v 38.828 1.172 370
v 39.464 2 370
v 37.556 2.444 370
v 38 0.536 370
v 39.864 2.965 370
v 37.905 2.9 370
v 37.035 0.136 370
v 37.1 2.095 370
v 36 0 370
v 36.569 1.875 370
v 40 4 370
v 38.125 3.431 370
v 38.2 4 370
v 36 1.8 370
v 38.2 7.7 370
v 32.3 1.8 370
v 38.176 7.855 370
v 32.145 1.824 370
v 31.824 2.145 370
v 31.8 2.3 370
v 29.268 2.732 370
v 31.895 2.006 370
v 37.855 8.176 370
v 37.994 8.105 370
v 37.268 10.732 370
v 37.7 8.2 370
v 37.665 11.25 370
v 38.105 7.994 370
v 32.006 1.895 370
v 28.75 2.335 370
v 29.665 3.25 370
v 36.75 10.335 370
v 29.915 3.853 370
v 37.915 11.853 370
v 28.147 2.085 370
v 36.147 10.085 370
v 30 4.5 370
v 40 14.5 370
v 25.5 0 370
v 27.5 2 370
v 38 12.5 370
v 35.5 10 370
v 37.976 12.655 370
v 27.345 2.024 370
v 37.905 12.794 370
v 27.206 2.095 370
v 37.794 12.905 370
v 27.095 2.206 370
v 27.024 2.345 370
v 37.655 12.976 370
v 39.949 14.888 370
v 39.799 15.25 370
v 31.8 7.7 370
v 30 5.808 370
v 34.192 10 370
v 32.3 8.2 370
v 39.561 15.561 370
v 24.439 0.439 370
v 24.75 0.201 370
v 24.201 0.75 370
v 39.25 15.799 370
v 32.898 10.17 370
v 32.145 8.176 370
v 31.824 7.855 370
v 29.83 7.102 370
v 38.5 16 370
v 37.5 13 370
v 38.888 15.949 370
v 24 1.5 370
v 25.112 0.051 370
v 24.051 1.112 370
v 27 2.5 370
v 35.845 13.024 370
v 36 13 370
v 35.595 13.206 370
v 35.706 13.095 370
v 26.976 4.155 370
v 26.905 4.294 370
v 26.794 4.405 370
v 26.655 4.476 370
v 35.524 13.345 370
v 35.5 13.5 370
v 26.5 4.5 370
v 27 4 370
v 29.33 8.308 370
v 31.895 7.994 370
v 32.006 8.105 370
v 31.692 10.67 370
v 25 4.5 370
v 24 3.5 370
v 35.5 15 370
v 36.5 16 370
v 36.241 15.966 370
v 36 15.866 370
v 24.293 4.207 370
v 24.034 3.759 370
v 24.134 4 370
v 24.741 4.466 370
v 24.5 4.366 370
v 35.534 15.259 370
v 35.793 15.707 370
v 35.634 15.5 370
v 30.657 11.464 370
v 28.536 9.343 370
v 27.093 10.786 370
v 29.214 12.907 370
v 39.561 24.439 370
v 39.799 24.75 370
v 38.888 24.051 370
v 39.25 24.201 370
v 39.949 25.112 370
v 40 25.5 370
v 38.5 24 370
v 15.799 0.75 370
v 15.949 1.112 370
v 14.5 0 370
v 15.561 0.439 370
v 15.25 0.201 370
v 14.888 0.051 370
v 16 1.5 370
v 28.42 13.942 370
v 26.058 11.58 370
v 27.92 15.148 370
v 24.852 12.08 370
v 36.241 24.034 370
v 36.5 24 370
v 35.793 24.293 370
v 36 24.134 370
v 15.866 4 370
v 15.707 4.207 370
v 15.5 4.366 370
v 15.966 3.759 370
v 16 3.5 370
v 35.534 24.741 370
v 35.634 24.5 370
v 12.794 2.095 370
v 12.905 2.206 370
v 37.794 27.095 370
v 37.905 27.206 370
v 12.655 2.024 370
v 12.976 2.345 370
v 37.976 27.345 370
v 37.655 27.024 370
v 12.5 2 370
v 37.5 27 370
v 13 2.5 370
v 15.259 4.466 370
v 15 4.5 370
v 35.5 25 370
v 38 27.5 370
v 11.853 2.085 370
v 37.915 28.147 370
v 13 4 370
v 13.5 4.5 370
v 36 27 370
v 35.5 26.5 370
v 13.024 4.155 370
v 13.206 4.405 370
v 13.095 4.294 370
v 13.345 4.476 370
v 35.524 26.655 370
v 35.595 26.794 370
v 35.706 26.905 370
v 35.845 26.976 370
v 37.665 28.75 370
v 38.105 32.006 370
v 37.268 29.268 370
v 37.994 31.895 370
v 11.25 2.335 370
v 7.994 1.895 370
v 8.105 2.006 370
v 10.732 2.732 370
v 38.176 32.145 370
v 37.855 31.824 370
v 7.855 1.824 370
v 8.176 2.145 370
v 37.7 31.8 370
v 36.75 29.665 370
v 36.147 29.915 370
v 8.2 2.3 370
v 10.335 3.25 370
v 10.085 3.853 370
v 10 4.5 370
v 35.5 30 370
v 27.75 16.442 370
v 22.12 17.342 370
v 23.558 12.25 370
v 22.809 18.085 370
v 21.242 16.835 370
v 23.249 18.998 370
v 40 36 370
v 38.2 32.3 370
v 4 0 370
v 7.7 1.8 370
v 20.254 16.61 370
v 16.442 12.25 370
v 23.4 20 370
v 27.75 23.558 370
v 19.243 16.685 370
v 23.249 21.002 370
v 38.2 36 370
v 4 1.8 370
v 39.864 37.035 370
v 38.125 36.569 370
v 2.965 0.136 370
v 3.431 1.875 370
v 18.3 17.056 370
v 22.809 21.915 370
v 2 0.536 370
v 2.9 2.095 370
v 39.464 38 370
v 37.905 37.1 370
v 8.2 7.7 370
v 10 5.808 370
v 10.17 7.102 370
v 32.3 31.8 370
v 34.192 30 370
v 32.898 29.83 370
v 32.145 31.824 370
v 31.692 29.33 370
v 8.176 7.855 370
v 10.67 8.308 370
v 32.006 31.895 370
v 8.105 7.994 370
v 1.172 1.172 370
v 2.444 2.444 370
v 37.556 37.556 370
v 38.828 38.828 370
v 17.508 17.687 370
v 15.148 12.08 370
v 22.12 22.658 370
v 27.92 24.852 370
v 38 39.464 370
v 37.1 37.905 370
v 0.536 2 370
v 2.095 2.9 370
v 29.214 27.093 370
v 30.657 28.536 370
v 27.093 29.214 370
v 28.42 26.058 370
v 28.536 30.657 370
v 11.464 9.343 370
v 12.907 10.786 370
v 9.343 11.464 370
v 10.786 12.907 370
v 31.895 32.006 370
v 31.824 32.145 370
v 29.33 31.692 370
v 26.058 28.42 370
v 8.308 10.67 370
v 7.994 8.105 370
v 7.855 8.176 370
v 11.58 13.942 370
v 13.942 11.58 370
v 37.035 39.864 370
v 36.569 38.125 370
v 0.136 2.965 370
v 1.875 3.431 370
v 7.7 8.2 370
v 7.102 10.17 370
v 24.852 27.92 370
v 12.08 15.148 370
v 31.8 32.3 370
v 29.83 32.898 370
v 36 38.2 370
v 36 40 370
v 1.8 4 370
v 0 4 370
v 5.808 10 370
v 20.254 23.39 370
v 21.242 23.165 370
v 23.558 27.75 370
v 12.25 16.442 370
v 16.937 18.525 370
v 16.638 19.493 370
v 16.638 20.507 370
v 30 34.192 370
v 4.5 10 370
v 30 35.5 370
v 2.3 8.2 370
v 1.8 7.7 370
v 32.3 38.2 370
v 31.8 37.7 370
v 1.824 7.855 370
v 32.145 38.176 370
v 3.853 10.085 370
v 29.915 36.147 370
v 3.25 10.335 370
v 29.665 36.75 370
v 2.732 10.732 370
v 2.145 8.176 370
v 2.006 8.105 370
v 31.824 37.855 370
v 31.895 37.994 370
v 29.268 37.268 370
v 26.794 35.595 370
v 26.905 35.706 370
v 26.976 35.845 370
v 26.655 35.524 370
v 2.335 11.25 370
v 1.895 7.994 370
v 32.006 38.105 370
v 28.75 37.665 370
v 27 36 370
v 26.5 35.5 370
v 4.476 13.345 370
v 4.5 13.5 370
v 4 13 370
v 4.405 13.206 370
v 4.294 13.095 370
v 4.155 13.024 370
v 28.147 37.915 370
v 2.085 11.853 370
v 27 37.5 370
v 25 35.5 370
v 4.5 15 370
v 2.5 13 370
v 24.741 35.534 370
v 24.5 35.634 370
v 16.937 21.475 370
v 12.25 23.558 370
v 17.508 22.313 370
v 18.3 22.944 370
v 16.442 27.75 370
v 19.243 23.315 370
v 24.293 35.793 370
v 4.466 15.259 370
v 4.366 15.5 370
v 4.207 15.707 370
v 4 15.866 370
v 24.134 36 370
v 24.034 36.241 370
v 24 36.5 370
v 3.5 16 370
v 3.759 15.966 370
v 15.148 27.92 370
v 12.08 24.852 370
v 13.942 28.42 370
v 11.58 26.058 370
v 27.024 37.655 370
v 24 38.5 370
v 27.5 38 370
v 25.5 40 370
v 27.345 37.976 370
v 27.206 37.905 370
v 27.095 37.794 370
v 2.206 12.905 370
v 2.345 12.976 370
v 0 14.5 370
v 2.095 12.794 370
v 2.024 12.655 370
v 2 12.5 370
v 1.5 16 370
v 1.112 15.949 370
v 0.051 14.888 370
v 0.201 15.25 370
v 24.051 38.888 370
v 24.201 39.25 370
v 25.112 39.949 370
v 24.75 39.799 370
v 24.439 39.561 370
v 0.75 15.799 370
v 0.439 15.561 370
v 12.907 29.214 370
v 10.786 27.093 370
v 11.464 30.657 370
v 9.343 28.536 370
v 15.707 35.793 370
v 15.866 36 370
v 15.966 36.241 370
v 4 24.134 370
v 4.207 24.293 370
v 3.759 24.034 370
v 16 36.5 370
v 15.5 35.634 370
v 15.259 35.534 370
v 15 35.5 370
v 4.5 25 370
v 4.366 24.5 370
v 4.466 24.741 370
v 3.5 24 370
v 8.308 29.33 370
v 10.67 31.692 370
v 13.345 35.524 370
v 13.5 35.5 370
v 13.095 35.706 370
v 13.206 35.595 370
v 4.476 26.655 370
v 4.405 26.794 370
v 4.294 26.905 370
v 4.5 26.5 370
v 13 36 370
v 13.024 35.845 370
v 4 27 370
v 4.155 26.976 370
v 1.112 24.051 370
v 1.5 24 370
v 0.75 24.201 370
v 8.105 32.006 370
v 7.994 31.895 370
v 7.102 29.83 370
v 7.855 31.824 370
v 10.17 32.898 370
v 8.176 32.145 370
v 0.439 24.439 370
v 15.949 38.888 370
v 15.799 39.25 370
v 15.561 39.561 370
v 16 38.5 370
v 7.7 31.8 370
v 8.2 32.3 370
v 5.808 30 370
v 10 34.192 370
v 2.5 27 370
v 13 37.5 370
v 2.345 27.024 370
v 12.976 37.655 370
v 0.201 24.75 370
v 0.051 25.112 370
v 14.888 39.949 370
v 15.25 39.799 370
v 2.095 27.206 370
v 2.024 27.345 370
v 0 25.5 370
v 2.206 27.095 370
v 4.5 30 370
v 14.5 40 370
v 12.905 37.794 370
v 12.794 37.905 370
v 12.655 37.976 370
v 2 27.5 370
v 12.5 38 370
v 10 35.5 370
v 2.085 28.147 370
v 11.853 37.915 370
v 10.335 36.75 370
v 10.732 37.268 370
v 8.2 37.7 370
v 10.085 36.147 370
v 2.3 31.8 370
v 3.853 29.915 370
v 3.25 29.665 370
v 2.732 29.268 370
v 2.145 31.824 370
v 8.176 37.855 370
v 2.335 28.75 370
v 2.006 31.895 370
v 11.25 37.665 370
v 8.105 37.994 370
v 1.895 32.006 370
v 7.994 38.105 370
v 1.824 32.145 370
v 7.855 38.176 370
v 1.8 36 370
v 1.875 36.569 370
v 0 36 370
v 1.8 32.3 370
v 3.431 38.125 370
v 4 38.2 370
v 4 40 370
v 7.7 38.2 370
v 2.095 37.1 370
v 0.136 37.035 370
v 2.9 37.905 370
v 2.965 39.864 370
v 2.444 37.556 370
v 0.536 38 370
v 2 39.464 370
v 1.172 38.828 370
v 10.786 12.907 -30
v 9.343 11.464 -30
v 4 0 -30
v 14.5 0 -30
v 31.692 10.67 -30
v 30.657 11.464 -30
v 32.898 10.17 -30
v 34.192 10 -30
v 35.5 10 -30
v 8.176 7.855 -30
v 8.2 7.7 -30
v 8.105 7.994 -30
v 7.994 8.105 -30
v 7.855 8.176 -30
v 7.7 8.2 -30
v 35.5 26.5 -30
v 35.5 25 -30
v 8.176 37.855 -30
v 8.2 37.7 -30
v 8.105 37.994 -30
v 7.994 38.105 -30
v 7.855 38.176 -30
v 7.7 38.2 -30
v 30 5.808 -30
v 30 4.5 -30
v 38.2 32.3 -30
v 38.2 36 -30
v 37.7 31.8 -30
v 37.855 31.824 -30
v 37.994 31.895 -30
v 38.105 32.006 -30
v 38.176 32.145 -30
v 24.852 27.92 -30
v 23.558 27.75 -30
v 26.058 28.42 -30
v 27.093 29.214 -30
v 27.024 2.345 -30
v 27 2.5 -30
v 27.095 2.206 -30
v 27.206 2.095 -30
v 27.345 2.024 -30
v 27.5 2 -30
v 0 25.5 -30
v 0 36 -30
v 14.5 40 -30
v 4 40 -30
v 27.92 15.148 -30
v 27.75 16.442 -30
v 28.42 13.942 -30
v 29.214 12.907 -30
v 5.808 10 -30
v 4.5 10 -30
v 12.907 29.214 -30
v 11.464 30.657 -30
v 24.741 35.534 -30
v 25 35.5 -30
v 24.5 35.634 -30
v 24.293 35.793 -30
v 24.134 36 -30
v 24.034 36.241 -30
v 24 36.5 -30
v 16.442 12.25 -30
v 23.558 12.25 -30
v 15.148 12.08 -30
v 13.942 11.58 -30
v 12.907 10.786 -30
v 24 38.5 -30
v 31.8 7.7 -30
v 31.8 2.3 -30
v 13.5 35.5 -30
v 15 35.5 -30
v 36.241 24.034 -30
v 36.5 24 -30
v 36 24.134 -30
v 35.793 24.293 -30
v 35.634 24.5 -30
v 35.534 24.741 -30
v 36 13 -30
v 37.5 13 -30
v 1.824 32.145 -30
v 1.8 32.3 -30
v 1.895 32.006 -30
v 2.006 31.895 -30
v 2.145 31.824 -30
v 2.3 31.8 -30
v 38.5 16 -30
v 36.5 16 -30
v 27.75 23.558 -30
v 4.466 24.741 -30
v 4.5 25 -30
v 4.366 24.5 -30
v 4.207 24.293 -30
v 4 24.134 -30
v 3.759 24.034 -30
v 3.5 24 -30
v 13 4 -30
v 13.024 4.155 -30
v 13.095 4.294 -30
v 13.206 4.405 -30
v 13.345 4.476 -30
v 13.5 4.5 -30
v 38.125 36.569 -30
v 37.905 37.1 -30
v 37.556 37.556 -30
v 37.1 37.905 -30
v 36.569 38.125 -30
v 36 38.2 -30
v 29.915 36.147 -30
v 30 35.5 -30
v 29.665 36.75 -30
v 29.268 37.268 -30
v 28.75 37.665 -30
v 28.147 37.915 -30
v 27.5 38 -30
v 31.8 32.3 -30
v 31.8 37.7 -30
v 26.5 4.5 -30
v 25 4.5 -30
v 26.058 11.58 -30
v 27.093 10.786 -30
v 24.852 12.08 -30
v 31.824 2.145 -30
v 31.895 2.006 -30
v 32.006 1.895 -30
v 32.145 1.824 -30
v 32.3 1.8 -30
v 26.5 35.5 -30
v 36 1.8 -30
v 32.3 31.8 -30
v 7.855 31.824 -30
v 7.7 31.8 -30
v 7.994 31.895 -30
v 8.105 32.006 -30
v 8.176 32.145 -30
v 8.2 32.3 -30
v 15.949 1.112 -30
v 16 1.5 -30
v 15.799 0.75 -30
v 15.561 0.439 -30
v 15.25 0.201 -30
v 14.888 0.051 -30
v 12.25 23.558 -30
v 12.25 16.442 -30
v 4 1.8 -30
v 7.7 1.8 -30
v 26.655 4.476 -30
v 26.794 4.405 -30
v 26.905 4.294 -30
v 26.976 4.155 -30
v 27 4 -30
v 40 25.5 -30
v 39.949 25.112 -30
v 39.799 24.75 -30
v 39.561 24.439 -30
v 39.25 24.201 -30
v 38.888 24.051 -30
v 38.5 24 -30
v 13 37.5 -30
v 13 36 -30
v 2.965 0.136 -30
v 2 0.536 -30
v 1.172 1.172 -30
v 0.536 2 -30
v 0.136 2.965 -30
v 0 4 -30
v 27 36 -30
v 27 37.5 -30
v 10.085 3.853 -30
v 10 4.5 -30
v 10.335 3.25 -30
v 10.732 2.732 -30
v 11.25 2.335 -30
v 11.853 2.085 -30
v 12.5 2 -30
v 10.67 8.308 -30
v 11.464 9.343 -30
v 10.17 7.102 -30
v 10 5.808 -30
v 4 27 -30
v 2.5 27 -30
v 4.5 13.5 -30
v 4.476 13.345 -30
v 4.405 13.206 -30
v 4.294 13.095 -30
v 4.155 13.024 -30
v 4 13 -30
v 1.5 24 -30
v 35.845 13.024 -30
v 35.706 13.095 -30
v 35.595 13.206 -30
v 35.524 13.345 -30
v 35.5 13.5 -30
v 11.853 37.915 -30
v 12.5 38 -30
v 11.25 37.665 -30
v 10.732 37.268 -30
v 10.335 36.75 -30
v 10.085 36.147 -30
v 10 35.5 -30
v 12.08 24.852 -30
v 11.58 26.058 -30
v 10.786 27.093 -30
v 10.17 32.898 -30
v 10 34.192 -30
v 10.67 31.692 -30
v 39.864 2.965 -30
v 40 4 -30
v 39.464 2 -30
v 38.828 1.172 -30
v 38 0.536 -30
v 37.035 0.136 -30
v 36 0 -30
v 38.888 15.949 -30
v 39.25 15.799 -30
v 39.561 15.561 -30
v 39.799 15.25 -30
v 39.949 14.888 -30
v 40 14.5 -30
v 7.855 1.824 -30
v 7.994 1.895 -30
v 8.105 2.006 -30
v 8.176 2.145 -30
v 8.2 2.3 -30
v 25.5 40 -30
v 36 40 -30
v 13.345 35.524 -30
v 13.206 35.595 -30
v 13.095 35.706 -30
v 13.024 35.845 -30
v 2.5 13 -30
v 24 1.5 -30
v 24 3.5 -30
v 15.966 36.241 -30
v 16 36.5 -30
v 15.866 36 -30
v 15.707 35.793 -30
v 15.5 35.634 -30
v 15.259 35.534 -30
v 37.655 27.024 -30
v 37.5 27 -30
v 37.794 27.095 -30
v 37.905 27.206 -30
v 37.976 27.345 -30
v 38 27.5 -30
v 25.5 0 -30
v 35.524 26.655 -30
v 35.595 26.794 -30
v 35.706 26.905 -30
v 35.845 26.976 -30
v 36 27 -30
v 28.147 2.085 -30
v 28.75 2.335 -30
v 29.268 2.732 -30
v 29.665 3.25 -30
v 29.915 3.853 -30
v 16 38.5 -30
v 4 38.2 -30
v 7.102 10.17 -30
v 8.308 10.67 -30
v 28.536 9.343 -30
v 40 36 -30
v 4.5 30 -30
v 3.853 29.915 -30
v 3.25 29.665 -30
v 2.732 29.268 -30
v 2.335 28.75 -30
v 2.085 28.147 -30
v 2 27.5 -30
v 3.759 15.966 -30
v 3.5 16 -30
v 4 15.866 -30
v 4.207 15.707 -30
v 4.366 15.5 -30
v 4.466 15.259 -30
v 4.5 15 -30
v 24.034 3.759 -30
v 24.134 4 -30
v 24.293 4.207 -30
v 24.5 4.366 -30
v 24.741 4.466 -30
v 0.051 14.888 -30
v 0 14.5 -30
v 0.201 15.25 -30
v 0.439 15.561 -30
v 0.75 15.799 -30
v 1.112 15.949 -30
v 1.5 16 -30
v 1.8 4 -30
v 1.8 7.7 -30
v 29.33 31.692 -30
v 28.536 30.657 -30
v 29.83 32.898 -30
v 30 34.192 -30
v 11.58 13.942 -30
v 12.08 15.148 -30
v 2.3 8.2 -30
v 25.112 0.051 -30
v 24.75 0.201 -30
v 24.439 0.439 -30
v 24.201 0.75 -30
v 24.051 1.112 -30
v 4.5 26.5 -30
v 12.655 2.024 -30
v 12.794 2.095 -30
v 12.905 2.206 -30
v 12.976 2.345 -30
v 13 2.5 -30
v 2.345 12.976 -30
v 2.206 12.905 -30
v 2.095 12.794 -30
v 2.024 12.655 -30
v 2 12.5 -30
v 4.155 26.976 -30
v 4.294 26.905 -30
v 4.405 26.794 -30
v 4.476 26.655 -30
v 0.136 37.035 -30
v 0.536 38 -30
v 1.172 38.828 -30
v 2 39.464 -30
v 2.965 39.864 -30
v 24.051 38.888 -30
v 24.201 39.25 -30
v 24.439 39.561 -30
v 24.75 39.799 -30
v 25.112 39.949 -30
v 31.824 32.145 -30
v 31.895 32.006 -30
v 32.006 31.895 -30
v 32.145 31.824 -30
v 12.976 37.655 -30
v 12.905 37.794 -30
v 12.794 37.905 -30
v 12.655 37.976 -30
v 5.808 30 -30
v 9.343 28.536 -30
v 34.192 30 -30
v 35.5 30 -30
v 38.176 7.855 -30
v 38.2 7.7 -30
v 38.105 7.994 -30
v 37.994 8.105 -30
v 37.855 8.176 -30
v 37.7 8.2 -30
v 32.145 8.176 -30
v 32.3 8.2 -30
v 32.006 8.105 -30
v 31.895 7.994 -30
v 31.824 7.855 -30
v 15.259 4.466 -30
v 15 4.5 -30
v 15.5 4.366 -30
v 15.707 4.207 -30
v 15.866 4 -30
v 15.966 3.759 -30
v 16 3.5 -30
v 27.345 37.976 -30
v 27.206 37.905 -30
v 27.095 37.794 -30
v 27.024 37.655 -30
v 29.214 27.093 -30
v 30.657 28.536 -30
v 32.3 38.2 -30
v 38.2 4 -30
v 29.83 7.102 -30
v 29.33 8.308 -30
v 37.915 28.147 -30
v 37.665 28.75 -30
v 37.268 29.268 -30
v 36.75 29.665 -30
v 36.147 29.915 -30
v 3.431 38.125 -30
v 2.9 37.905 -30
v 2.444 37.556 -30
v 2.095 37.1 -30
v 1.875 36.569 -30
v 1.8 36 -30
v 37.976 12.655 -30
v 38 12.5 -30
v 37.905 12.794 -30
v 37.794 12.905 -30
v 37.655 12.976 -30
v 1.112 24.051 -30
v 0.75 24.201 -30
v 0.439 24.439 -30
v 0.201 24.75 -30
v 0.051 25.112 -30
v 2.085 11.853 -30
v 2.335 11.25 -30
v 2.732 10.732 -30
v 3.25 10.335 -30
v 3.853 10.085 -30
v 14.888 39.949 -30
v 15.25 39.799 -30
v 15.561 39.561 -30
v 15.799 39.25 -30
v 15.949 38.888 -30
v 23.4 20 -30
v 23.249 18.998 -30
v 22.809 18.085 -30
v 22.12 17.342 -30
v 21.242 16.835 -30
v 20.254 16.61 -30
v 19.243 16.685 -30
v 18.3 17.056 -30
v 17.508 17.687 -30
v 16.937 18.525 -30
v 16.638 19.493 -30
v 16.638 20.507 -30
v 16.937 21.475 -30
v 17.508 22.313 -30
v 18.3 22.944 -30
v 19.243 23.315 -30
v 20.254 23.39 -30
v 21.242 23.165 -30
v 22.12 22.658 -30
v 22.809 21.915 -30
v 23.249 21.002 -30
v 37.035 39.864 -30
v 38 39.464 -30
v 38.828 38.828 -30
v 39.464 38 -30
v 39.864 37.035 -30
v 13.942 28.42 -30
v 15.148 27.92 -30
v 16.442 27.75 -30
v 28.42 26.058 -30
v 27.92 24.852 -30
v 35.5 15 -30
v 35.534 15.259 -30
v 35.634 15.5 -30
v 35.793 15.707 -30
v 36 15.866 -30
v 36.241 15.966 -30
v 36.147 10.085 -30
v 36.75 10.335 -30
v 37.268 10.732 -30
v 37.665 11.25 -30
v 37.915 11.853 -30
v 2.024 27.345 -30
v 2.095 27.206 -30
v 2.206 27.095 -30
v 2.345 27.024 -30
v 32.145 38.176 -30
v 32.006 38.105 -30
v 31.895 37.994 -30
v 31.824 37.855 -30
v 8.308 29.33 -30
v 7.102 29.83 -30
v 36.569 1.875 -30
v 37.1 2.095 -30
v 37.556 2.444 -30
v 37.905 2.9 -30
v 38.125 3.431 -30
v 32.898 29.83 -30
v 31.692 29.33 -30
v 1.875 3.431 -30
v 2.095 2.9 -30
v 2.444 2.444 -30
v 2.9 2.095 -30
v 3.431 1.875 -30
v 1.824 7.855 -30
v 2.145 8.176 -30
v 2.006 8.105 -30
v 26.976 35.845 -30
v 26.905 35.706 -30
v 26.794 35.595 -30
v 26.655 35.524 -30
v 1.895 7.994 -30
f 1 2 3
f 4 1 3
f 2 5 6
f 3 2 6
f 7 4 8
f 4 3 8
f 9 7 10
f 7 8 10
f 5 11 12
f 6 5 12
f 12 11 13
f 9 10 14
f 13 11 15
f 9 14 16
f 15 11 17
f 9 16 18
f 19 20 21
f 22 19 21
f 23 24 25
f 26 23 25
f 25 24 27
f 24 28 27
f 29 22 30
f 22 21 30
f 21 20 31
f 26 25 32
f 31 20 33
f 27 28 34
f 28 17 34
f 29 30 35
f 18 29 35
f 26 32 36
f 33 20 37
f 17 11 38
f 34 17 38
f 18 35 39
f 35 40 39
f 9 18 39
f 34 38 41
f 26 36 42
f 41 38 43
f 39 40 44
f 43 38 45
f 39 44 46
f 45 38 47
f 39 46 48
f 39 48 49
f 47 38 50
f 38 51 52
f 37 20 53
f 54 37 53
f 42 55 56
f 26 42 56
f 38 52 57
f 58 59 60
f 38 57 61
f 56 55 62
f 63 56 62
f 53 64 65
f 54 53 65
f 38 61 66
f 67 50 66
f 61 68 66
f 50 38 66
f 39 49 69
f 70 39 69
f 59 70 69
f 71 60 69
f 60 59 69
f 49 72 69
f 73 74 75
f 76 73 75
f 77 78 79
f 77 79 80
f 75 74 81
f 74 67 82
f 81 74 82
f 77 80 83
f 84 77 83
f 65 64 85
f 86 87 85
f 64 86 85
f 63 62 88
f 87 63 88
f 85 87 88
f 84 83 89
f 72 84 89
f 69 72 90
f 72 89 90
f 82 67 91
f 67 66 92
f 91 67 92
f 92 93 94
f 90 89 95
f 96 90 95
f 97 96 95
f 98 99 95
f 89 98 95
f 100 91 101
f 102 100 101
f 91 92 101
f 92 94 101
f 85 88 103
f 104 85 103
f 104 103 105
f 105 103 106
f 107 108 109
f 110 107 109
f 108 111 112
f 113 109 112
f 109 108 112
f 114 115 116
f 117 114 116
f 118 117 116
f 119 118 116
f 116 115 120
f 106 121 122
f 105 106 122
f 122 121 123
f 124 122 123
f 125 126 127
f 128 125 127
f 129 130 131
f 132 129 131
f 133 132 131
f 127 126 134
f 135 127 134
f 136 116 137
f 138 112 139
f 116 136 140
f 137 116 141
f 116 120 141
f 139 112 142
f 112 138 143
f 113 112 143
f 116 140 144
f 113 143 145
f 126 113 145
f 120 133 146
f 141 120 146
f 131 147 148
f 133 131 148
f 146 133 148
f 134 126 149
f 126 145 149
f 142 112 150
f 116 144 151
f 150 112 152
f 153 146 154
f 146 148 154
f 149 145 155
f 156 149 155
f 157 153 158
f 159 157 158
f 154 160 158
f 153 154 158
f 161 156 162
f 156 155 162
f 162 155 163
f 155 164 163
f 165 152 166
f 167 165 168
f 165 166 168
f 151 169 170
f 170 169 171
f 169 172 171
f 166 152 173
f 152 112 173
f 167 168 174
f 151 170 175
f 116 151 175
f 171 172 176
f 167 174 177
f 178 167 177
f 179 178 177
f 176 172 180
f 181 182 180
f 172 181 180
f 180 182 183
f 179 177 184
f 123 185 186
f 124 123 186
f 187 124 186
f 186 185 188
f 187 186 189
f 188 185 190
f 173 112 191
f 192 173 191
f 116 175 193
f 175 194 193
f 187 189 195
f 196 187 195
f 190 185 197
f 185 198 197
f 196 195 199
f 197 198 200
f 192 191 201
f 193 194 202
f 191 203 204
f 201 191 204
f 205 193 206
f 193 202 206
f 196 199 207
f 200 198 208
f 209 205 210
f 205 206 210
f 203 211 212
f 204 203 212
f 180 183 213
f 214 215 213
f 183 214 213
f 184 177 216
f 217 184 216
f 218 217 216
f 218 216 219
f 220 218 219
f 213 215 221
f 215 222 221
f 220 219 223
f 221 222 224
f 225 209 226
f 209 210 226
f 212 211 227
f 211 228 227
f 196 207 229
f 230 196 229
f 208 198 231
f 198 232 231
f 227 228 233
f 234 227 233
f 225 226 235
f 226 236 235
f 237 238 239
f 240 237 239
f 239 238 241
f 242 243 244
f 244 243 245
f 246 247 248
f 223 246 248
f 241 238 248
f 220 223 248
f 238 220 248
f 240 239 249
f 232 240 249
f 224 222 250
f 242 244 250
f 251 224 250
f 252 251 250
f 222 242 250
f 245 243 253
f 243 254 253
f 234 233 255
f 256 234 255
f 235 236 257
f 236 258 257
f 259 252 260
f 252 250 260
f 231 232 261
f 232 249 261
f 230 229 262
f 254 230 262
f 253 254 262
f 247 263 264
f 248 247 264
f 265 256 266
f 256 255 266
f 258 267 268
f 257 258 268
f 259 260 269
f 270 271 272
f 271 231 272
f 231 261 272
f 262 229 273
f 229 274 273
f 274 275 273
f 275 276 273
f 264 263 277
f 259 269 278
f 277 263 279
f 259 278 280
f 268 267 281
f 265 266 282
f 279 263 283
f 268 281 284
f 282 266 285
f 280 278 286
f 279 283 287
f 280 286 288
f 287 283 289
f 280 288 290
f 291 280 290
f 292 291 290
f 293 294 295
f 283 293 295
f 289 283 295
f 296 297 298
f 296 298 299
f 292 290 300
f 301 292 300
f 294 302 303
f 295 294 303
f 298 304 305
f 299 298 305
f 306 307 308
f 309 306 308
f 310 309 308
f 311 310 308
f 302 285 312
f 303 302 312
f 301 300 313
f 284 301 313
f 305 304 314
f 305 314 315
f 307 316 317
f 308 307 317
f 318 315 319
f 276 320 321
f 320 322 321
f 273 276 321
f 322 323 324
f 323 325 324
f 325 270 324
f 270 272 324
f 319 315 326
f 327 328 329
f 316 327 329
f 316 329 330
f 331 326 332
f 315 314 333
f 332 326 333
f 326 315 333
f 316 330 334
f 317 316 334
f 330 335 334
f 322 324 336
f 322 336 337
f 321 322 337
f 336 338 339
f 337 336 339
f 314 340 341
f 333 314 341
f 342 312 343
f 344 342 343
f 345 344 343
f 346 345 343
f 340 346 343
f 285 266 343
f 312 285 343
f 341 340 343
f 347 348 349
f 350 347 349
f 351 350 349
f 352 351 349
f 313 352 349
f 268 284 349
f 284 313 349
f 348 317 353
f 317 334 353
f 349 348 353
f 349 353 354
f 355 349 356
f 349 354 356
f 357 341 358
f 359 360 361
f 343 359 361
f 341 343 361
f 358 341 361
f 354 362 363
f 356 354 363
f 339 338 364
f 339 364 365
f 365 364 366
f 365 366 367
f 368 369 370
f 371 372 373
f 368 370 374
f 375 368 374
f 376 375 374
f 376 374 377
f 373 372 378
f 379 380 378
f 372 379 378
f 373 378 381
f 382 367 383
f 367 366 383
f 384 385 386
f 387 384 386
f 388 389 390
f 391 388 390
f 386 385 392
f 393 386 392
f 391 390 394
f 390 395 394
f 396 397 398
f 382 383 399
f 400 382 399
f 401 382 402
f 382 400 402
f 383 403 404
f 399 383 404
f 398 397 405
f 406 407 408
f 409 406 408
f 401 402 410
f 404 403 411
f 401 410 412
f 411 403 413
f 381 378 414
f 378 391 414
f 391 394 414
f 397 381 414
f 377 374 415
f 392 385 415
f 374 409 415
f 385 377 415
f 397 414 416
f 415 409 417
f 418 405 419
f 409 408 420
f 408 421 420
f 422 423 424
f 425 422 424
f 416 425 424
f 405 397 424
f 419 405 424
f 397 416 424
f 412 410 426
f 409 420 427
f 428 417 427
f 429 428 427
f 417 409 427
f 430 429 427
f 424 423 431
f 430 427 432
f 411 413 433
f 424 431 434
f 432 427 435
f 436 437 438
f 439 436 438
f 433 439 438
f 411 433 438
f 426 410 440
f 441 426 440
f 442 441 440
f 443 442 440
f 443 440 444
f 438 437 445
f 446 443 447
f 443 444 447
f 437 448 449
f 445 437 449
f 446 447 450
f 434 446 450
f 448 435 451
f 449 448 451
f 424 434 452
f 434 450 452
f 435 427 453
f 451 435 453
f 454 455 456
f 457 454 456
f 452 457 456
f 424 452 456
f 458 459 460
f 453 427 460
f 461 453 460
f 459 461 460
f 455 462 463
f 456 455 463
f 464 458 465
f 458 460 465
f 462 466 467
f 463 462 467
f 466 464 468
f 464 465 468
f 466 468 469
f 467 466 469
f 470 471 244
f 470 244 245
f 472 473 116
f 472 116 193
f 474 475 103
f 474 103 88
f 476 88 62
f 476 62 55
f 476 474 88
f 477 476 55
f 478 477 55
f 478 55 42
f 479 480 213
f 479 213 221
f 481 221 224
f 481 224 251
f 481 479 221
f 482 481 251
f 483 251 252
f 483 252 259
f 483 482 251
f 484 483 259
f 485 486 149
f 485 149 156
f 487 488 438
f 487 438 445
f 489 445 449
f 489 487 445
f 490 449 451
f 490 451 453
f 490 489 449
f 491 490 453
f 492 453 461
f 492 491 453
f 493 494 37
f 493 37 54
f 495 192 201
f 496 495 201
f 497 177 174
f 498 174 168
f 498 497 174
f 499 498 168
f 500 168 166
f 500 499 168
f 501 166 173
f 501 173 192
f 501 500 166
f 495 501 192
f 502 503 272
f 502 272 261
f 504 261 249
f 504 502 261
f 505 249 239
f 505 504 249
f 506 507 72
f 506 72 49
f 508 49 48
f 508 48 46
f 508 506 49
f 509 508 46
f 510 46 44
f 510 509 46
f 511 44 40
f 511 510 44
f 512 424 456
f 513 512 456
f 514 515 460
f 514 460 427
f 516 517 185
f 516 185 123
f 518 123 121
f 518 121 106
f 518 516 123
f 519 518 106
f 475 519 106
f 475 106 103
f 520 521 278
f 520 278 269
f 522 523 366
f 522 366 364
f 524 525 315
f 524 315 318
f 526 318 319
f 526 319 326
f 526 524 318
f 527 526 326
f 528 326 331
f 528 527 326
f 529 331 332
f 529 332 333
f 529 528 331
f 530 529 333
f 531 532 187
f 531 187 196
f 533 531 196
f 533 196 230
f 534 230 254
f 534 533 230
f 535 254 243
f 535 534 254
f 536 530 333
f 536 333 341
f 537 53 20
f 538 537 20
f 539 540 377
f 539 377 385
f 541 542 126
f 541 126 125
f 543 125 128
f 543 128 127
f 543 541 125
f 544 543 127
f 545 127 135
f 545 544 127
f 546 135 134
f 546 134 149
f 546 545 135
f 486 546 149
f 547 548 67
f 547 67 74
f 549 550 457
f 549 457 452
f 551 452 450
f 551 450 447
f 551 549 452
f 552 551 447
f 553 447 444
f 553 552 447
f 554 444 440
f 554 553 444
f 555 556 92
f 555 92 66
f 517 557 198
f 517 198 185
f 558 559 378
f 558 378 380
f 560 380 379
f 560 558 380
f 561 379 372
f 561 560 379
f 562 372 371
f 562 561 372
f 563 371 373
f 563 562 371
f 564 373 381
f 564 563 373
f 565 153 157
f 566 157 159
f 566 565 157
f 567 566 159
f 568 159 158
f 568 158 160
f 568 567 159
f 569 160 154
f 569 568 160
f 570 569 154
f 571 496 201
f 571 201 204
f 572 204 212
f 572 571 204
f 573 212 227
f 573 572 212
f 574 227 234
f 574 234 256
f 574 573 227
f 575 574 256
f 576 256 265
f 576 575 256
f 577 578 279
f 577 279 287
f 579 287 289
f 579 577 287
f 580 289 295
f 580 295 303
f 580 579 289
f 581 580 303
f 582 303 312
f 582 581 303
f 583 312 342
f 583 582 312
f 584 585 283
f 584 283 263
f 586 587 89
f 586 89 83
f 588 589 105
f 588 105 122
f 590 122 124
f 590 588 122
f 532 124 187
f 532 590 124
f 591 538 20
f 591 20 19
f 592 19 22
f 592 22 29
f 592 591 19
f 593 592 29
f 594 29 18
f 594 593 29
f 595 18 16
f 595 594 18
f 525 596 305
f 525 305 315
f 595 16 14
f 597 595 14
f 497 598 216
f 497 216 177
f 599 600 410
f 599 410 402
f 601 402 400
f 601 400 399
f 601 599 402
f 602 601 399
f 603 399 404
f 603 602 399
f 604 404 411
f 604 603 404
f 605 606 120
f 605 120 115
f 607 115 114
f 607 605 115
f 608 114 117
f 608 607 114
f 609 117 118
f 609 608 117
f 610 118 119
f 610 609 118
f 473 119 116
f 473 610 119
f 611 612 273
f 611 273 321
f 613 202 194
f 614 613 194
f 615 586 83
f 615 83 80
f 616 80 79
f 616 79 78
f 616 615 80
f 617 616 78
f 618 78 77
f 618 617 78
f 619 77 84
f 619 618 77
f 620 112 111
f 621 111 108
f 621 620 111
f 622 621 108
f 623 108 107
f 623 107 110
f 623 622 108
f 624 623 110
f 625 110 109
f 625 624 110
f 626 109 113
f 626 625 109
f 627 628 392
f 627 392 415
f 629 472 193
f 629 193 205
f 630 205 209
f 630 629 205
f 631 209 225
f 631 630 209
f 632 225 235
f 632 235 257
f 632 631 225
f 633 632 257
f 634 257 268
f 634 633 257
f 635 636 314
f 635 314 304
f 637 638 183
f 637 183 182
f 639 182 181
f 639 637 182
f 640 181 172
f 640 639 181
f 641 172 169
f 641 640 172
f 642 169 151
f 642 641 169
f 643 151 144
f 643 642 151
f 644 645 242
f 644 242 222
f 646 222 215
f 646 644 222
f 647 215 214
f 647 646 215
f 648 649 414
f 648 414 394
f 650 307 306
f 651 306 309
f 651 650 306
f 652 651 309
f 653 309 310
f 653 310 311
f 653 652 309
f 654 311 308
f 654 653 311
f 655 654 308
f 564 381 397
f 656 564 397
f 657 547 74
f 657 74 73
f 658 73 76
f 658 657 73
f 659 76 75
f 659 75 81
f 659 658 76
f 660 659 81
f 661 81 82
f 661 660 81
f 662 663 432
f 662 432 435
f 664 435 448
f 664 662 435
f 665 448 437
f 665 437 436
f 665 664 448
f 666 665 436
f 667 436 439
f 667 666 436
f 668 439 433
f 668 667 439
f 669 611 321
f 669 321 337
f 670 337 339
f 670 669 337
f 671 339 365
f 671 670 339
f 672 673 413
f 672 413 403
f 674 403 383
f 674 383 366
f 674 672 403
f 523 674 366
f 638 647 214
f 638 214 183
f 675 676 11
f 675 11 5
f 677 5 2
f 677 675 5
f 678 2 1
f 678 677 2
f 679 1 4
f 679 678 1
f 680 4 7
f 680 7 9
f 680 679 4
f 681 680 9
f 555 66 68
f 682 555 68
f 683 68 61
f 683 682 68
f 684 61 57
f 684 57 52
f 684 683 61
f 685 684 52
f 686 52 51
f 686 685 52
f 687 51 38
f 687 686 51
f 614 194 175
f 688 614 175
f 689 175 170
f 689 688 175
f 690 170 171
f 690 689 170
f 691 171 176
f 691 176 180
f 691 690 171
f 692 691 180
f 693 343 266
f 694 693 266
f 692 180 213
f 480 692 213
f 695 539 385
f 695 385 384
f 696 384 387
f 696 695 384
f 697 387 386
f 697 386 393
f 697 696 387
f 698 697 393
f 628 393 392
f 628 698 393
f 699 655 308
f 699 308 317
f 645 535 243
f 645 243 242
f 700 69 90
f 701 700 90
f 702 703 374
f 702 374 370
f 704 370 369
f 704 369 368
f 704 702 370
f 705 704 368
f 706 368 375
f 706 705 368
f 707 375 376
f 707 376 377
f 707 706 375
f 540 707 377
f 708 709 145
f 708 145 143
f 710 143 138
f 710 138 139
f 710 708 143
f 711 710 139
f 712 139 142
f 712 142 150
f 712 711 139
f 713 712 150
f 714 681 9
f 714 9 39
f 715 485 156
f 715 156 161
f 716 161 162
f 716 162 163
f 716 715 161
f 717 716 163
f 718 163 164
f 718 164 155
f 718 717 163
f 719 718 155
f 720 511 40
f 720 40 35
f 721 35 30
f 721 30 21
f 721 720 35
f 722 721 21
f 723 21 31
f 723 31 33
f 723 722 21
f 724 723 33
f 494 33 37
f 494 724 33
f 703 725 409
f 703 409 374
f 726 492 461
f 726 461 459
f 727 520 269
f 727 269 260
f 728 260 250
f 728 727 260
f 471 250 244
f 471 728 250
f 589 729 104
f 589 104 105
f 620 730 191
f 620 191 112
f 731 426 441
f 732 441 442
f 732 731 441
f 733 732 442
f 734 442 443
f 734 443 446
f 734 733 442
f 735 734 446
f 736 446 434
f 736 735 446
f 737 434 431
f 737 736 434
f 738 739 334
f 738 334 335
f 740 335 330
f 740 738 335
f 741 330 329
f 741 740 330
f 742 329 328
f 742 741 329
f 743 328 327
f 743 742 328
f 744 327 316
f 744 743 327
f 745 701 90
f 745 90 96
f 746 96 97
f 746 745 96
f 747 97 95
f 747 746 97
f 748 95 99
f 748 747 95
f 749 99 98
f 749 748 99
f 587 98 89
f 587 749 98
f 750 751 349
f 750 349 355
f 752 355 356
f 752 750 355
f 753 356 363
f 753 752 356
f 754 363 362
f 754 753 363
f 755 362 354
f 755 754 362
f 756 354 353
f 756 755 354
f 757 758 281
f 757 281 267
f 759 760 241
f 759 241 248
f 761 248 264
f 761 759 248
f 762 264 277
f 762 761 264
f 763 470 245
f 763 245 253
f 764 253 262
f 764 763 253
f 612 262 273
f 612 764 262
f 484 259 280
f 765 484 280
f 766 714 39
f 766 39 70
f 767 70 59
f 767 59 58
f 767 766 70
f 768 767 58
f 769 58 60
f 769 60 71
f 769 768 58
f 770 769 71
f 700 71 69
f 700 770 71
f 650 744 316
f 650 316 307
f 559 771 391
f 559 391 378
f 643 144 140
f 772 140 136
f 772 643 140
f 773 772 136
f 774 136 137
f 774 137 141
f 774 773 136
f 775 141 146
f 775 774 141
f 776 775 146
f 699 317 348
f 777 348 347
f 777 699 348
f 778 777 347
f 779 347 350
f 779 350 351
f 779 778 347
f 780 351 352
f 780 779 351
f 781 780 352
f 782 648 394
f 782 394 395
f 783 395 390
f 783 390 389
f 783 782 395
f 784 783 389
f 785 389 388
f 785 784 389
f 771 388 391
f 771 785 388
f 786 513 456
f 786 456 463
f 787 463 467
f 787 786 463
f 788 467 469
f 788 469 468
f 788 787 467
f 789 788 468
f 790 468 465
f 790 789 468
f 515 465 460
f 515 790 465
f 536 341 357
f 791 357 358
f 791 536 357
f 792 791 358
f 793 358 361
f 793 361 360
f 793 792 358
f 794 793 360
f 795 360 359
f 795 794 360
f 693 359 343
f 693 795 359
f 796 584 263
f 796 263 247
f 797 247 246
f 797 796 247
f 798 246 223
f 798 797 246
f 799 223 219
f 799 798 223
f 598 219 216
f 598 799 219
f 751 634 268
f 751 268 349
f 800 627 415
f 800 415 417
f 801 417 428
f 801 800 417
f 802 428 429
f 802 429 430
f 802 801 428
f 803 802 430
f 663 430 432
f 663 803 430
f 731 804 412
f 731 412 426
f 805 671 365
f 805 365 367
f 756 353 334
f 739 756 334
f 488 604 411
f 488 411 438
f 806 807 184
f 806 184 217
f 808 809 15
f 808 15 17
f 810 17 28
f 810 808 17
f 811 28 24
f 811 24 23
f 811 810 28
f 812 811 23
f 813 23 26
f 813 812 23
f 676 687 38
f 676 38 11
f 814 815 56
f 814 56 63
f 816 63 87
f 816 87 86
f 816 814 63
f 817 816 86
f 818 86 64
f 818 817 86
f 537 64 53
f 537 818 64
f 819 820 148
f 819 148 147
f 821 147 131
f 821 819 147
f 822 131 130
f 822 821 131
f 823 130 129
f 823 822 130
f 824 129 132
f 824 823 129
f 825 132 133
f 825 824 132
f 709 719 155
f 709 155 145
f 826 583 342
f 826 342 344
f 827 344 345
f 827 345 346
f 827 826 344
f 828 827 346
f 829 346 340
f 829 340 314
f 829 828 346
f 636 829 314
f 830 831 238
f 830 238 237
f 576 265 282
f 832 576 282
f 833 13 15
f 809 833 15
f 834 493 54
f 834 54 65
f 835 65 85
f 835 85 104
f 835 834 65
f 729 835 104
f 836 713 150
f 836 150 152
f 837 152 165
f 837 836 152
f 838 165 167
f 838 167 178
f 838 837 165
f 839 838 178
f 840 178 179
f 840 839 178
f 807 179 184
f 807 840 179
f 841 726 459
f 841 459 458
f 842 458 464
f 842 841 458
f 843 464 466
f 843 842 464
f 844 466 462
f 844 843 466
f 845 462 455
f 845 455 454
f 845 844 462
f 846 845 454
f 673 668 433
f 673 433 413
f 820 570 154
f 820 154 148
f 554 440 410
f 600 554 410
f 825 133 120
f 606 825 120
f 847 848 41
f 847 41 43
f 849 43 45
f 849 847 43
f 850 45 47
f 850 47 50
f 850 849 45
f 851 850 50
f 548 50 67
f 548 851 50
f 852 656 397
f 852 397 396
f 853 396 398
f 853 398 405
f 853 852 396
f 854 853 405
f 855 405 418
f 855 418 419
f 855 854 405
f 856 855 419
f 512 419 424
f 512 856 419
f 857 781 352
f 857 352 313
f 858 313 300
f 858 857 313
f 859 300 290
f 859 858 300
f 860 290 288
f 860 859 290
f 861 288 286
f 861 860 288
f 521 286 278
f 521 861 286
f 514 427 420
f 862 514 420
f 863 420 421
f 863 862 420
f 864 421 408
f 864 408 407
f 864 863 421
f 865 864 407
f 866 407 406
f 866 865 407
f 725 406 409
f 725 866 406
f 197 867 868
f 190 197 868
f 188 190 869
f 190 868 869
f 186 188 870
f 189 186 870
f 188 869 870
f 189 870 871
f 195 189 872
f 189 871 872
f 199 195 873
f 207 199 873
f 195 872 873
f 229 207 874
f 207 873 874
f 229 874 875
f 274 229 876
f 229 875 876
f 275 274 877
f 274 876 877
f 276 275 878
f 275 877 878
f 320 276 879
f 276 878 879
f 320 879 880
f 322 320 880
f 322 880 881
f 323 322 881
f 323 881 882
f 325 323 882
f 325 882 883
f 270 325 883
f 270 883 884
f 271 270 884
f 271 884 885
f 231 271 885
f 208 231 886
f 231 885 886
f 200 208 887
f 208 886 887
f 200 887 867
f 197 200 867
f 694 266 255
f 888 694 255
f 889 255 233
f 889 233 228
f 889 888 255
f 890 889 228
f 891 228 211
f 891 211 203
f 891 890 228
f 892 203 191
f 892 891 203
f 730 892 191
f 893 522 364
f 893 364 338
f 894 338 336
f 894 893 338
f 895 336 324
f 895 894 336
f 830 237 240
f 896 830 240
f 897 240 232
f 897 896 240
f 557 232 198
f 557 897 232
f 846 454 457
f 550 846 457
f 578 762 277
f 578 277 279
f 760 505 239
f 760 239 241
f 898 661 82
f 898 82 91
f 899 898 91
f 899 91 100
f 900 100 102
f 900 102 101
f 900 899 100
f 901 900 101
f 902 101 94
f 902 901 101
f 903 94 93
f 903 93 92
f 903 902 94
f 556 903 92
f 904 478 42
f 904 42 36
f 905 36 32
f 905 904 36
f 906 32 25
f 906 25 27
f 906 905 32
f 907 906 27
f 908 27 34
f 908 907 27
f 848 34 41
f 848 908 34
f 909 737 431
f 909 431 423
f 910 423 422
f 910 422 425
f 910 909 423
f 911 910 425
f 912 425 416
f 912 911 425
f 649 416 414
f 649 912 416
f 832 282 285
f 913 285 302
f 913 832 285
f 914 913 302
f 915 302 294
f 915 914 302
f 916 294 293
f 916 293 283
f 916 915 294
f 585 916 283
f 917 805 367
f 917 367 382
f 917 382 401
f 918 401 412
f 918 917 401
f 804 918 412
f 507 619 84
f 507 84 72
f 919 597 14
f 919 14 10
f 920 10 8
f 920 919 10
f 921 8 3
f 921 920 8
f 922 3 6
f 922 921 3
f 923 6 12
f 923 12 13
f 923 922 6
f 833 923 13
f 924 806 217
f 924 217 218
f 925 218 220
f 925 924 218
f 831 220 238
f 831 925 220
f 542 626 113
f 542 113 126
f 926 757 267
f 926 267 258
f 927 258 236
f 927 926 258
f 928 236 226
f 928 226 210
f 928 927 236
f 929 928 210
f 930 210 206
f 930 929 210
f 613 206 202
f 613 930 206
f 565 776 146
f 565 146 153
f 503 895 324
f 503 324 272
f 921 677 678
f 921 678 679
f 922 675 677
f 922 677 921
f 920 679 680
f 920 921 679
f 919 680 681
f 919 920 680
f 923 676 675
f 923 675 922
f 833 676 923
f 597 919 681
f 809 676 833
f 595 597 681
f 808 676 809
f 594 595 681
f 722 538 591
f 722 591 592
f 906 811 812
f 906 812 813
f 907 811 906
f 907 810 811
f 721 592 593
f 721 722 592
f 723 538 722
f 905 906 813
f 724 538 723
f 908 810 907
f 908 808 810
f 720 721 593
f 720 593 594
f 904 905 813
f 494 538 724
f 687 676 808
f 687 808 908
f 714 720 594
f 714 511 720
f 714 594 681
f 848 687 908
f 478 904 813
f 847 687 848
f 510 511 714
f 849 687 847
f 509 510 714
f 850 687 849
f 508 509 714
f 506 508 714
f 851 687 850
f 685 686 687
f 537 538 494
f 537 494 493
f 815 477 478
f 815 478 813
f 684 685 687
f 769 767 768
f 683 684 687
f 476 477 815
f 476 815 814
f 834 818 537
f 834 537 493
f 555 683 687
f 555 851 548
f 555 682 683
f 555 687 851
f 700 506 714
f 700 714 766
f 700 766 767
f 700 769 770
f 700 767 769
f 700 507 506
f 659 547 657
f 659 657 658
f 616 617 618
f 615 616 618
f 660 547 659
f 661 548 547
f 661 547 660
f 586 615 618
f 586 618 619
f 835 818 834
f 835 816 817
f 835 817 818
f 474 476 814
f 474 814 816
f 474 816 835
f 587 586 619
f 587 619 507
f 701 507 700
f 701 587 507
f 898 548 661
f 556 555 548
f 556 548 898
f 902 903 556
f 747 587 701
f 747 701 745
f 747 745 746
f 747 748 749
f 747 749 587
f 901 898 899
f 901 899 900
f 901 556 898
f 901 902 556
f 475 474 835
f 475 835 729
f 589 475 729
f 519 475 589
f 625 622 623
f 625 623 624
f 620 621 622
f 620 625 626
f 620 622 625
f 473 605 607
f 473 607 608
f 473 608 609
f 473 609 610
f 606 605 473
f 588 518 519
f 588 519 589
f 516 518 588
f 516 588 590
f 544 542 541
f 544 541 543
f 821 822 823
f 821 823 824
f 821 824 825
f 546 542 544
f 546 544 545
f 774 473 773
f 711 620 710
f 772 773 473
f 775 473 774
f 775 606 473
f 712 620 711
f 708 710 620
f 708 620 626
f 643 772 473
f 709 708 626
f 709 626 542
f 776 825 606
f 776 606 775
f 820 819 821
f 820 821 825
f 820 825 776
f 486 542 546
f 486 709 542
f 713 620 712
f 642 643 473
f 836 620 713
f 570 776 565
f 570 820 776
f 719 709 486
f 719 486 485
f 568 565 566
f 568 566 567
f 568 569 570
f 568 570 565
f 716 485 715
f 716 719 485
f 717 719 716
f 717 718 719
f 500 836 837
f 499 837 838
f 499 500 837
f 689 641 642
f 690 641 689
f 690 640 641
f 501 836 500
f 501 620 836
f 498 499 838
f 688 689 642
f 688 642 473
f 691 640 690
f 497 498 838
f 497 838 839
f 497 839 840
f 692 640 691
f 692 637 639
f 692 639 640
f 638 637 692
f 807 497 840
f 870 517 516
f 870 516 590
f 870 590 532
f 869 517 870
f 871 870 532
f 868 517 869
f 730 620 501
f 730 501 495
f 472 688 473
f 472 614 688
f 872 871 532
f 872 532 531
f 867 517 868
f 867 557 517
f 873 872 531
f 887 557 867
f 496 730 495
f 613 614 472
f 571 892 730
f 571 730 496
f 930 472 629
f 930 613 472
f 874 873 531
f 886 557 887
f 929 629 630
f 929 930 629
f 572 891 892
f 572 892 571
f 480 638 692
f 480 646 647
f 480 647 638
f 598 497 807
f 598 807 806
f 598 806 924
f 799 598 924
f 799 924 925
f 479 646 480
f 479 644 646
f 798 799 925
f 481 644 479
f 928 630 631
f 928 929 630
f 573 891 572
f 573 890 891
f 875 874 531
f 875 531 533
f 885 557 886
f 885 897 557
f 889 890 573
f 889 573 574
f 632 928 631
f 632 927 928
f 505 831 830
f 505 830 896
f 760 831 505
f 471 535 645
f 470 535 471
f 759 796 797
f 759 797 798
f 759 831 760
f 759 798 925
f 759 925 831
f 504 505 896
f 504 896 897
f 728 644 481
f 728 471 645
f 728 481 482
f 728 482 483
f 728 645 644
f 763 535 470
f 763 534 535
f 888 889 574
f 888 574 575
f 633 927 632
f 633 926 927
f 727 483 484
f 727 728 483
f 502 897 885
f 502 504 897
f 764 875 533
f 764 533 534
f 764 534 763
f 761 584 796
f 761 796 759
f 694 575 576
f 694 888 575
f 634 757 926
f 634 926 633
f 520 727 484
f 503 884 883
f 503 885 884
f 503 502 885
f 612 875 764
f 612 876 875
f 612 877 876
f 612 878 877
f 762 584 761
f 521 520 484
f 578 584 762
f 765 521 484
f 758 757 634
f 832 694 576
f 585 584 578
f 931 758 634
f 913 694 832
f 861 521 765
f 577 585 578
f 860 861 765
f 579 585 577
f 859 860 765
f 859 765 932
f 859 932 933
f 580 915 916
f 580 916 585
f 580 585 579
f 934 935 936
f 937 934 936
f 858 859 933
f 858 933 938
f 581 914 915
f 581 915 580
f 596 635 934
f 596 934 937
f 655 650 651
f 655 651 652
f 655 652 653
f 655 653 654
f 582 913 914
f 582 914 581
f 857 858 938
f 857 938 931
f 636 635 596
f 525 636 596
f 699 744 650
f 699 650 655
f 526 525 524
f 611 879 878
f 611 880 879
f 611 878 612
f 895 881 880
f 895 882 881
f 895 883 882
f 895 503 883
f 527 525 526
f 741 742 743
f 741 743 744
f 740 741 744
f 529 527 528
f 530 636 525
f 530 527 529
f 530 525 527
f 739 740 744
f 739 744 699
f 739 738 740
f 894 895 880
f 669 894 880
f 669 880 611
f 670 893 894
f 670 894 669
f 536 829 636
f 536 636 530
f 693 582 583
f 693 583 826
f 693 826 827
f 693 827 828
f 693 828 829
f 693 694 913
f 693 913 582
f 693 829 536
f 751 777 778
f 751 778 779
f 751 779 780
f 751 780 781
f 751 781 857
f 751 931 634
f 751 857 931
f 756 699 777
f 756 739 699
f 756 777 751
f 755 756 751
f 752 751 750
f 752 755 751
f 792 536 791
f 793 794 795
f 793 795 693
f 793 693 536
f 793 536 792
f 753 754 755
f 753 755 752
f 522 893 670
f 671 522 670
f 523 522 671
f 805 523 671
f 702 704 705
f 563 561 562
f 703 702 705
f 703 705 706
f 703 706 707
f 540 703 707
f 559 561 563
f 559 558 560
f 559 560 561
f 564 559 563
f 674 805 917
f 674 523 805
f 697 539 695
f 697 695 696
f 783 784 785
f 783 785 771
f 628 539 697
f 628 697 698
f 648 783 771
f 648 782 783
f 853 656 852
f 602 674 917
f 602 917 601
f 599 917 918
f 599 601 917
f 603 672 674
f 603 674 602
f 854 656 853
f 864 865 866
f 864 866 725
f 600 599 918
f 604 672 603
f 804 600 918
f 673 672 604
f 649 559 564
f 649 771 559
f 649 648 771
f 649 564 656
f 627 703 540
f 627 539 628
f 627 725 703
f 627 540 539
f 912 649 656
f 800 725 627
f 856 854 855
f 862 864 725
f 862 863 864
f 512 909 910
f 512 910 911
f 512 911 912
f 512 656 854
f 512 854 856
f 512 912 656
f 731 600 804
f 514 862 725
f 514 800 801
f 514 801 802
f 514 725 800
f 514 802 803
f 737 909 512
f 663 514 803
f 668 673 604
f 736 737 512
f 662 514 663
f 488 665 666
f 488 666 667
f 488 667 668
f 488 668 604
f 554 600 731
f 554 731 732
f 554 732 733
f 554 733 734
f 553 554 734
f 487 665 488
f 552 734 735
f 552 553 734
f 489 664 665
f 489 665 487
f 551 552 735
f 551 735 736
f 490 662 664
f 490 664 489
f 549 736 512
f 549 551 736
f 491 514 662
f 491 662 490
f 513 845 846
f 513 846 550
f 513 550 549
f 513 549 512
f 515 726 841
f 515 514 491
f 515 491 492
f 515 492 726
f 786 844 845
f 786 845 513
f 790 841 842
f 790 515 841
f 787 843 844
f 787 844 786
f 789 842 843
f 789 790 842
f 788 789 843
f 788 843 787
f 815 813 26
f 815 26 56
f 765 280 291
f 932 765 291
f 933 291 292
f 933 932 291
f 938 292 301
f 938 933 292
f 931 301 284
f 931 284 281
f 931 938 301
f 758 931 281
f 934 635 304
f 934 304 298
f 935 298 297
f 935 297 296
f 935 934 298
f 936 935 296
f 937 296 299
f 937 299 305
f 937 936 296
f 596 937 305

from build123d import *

# Parameters (mm, degrees)
ESQUISSE1_R        = 3.4
BOSS_EXTRU_1_DEPTH = 400


with BuildPart() as part:
    # Esquisse1 → Boss.-Extru.1 (new body)
    with BuildSketch(Plane(origin=(0, 0, -30), x_dir=(-1, 0, 0), z_dir=(0, 0, -1))):
        with BuildLine():
            Line((-4.5, 15), (-4.5, 13.5))
            ThreePointArc((-4.5, 13.5), (-4.353553391, 13.146446609), (-4, 13))
            Line((-4, 13), (-2.5, 13))
            ThreePointArc((-2.5, 13), (-2.146446609, 12.853553391), (-2, 12.5))
            ThreePointArc((-2, 12.5), (-2.732233047, 10.732233047), (-4.5, 10))
            Line((-4.5, 10), (-5.807611845, 10))
            ThreePointArc((-5.807611845, 10), (-7.721029006, 10.380602337), (-9.343145751, 11.464466094))
            Line((-9.343145751, 11.464466094), (-10.785533906, 12.906854249))
            ThreePointArc((-10.785533906, 12.906854249), (-11.869397663, 14.528970994), (-12.25, 16.442388155))
            Line((-12.25, 16.442388155), (-12.25, 23.557611845))
            ThreePointArc((-12.25, 23.557611845), (-11.869397663, 25.471029006), (-10.785533906, 27.093145751))
            Line((-10.785533906, 27.093145751), (-9.343145751, 28.535533906))
            ThreePointArc((-9.343145751, 28.535533906), (-7.721029006, 29.619397663), (-5.807611845, 30))
            Line((-5.807611845, 30), (-4.5, 30))
            ThreePointArc((-4.5, 30), (-2.732233047, 29.267766953), (-2, 27.5))
            ThreePointArc((-2, 27.5), (-2.146446609, 27.146446609), (-2.5, 27))
            Line((-2.5, 27), (-4, 27))
            ThreePointArc((-4, 27), (-4.353553391, 26.853553391), (-4.5, 26.5))
            Line((-4.5, 26.5), (-4.5, 25))
            ThreePointArc((-4.5, 25), (-4.207106781, 24.292893219), (-3.5, 24))
            Line((-3.5, 24), (-1.5, 24))
            ThreePointArc((-1.5, 24), (-0.439339828, 24.439339828), (0, 25.5))
            Line((0, 25.5), (0, 36))
            ThreePointArc((0, 36), (-1.171572875, 38.828427125), (-4, 40))
            Line((-4, 40), (-14.5, 40))
            ThreePointArc((-14.5, 40), (-15.560660172, 39.560660172), (-16, 38.5))
            Line((-16, 38.5), (-16, 36.5))
            ThreePointArc((-16, 36.5), (-15.707106781, 35.792893219), (-15, 35.5))
            Line((-15, 35.5), (-13.5, 35.5))
            ThreePointArc((-13.5, 35.5), (-13.146446609, 35.646446609), (-13, 36))
            Line((-13, 36), (-13, 37.5))
            ThreePointArc((-13, 37.5), (-12.853553391, 37.853553391), (-12.5, 38))
            ThreePointArc((-12.5, 38), (-10.732233047, 37.267766953), (-10, 35.5))
            Line((-10, 35.5), (-10, 34.192388155))
            ThreePointArc((-10, 34.192388155), (-10.380602337, 32.278970994), (-11.464466094, 30.656854249))
            Line((-11.464466094, 30.656854249), (-12.906854249, 29.214466094))
            ThreePointArc((-12.906854249, 29.214466094), (-14.528970994, 28.130602337), (-16.442388155, 27.75))
            Line((-16.442388155, 27.75), (-23.557611845, 27.75))
            ThreePointArc((-23.557611845, 27.75), (-25.471029006, 28.130602337), (-27.093145751, 29.214466094))
            Line((-27.093145751, 29.214466094), (-28.535533906, 30.656854249))
            ThreePointArc((-28.535533906, 30.656854249), (-29.619397663, 32.278970994), (-30, 34.192388155))
            Line((-30, 34.192388155), (-30, 35.5))
            ThreePointArc((-30, 35.5), (-29.267766953, 37.267766953), (-27.5, 38))
            ThreePointArc((-27.5, 38), (-27.146446609, 37.853553391), (-27, 37.5))
            Line((-27, 37.5), (-27, 36))
            ThreePointArc((-27, 36), (-26.853553391, 35.646446609), (-26.5, 35.5))
            Line((-26.5, 35.5), (-25, 35.5))
            ThreePointArc((-25, 35.5), (-24.292893219, 35.792893219), (-24, 36.5))
            Line((-24, 36.5), (-24, 38.5))
            ThreePointArc((-24, 38.5), (-24.439339828, 39.560660172), (-25.5, 40))
            Line((-25.5, 40), (-36, 40))
            ThreePointArc((-36, 40), (-38.828427125, 38.828427125), (-40, 36))
            Line((-40, 36), (-40, 25.5))
            ThreePointArc((-40, 25.5), (-39.560660172, 24.439339828), (-38.5, 24))
            Line((-38.5, 24), (-36.5, 24))
            ThreePointArc((-36.5, 24), (-35.792893219, 24.292893219), (-35.5, 25))
            Line((-35.5, 25), (-35.5, 26.5))
            ThreePointArc((-35.5, 26.5), (-35.646446609, 26.853553391), (-36, 27))
            Line((-36, 27), (-37.5, 27))
            ThreePointArc((-37.5, 27), (-37.853553391, 27.146446609), (-38, 27.5))
            ThreePointArc((-38, 27.5), (-37.267766953, 29.267766953), (-35.5, 30))
            Line((-35.5, 30), (-34.192388155, 30))
            ThreePointArc((-34.192388155, 30), (-32.278970994, 29.619397663), (-30.656854249, 28.535533906))
            Line((-30.656854249, 28.535533906), (-29.214466094, 27.093145751))
            ThreePointArc((-29.214466094, 27.093145751), (-28.130602337, 25.471029006), (-27.75, 23.557611845))
            Line((-27.75, 23.557611845), (-27.75, 16.442388155))
            ThreePointArc((-27.75, 16.442388155), (-28.130602337, 14.528970994), (-29.214466094, 12.906854249))
            Line((-29.214466094, 12.906854249), (-30.656854249, 11.464466094))
            ThreePointArc((-30.656854249, 11.464466094), (-32.278970994, 10.380602337), (-34.192388155, 10))
            Line((-34.192388155, 10), (-35.5, 10))
            ThreePointArc((-35.5, 10), (-37.267766953, 10.732233047), (-38, 12.5))
            ThreePointArc((-38, 12.5), (-37.853553391, 12.853553391), (-37.5, 13))
            Line((-37.5, 13), (-36, 13))
            ThreePointArc((-36, 13), (-35.646446609, 13.146446609), (-35.5, 13.5))
            Line((-35.5, 13.5), (-35.5, 15))
            ThreePointArc((-35.5, 15), (-35.792893219, 15.707106781), (-36.5, 16))
            Line((-36.5, 16), (-38.5, 16))
            ThreePointArc((-38.5, 16), (-39.560660172, 15.560660172), (-40, 14.5))
            Line((-40, 14.5), (-40, 4))
            ThreePointArc((-40, 4), (-38.828427125, 1.171572875), (-36, 0))
            Line((-36, 0), (-25.5, 0))
            ThreePointArc((-25.5, 0), (-24.439339828, 0.439339828), (-24, 1.5))
            Line((-24, 1.5), (-24, 3.5))
            ThreePointArc((-24, 3.5), (-24.292893219, 4.207106781), (-25, 4.5))
            Line((-25, 4.5), (-26.5, 4.5))
            ThreePointArc((-26.5, 4.5), (-26.853553391, 4.353553391), (-27, 4))
            Line((-27, 4), (-27, 2.5))
            ThreePointArc((-27, 2.5), (-27.146446609, 2.146446609), (-27.5, 2))
            ThreePointArc((-27.5, 2), (-29.267766953, 2.732233047), (-30, 4.5))
            Line((-30, 4.5), (-30, 5.807611845))
            ThreePointArc((-30, 5.807611845), (-29.619397663, 7.721029006), (-28.535533906, 9.343145751))
            Line((-28.535533906, 9.343145751), (-27.093145751, 10.785533906))
            ThreePointArc((-27.093145751, 10.785533906), (-25.471029006, 11.869397663), (-23.557611845, 12.25))
            Line((-23.557611845, 12.25), (-16.442388155, 12.25))
            ThreePointArc((-16.442388155, 12.25), (-14.528970994, 11.869397663), (-12.906854249, 10.785533906))
            Line((-12.906854249, 10.785533906), (-11.464466094, 9.343145751))
            ThreePointArc((-11.464466094, 9.343145751), (-10.380602337, 7.721029006), (-10, 5.807611845))
            Line((-10, 5.807611845), (-10, 4.5))
            ThreePointArc((-10, 4.5), (-10.732233047, 2.732233047), (-12.5, 2))
            ThreePointArc((-12.5, 2), (-12.853553391, 2.146446609), (-13, 2.5))
            Line((-13, 2.5), (-13, 4))
            ThreePointArc((-13, 4), (-13.146446609, 4.353553391), (-13.5, 4.5))
            Line((-13.5, 4.5), (-15, 4.5))
            ThreePointArc((-15, 4.5), (-15.707106781, 4.207106781), (-16, 3.5))
            Line((-16, 3.5), (-16, 1.5))
            ThreePointArc((-16, 1.5), (-15.560660172, 0.439339828), (-14.5, 0))
            Line((-14.5, 0), (-4, 0))
            ThreePointArc((-4, 0), (-1.171572875, 1.171572875), (0, 4))
            Line((0, 4), (0, 14.5))
            ThreePointArc((0, 14.5), (-0.439339828, 15.560660172), (-1.5, 16))
            Line((-1.5, 16), (-3.5, 16))
            ThreePointArc((-3.5, 16), (-4.207106781, 15.707106781), (-4.5, 15))
        make_face()
        with Locations(Location((-20, 20, 0), (0, 0, 180))):
            Circle(ESQUISSE1_R, mode=Mode.SUBTRACT)
        with BuildLine():
            Line((-4, 1.8), (-7.7, 1.8))
            ThreePointArc((-7.7, 1.8), (-8.053553391, 1.946446609), (-8.2, 2.3))
            Line((-8.2, 2.3), (-8.2, 7.7))
            ThreePointArc((-8.2, 7.7), (-8.053553391, 8.053553391), (-7.7, 8.2))
            Line((-7.7, 8.2), (-2.3, 8.2))
            ThreePointArc((-2.3, 8.2), (-1.946446609, 8.053553391), (-1.8, 7.7))
            Line((-1.8, 7.7), (-1.8, 4))
            ThreePointArc((-1.8, 4), (-2.444365081, 2.444365081), (-4, 1.8))
        make_face(mode=Mode.SUBTRACT)
        with BuildLine():
            Line((-38.2, 4), (-38.2, 7.7))
            ThreePointArc((-38.2, 7.7), (-38.053553391, 8.053553391), (-37.7, 8.2))
            Line((-37.7, 8.2), (-32.3, 8.2))
            ThreePointArc((-32.3, 8.2), (-31.946446609, 8.053553391), (-31.8, 7.7))
            Line((-31.8, 7.7), (-31.8, 2.3))
            ThreePointArc((-31.8, 2.3), (-31.946446609, 1.946446609), (-32.3, 1.8))
            Line((-32.3, 1.8), (-36, 1.8))
            ThreePointArc((-36, 1.8), (-37.555634919, 2.444365081), (-38.2, 4))
        make_face(mode=Mode.SUBTRACT)
        with BuildLine():
            Line((-36, 38.2), (-32.3, 38.2))
            ThreePointArc((-32.3, 38.2), (-31.946446609, 38.053553391), (-31.8, 37.7))
            Line((-31.8, 37.7), (-31.8, 32.3))
            ThreePointArc((-31.8, 32.3), (-31.946446609, 31.946446609), (-32.3, 31.8))
            Line((-32.3, 31.8), (-37.7, 31.8))
            ThreePointArc((-37.7, 31.8), (-38.053553391, 31.946446609), (-38.2, 32.3))
            Line((-38.2, 32.3), (-38.2, 36))
            ThreePointArc((-38.2, 36), (-37.555634919, 37.555634919), (-36, 38.2))
        make_face(mode=Mode.SUBTRACT)
        with BuildLine():
            Line((-1.8, 36), (-1.8, 32.3))
            ThreePointArc((-1.8, 32.3), (-1.946446609, 31.946446609), (-2.3, 31.8))
            Line((-2.3, 31.8), (-7.7, 31.8))
            ThreePointArc((-7.7, 31.8), (-8.053553391, 31.946446609), (-8.2, 32.3))
            Line((-8.2, 32.3), (-8.2, 37.7))
            ThreePointArc((-8.2, 37.7), (-8.053553391, 38.053553391), (-7.7, 38.2))
            Line((-7.7, 38.2), (-4, 38.2))
            ThreePointArc((-4, 38.2), (-2.444365081, 37.555634919), (-1.8, 36))
        make_face(mode=Mode.SUBTRACT)
    extrude(amount=-BOSS_EXTRU_1_DEPTH)


solid = part.part
